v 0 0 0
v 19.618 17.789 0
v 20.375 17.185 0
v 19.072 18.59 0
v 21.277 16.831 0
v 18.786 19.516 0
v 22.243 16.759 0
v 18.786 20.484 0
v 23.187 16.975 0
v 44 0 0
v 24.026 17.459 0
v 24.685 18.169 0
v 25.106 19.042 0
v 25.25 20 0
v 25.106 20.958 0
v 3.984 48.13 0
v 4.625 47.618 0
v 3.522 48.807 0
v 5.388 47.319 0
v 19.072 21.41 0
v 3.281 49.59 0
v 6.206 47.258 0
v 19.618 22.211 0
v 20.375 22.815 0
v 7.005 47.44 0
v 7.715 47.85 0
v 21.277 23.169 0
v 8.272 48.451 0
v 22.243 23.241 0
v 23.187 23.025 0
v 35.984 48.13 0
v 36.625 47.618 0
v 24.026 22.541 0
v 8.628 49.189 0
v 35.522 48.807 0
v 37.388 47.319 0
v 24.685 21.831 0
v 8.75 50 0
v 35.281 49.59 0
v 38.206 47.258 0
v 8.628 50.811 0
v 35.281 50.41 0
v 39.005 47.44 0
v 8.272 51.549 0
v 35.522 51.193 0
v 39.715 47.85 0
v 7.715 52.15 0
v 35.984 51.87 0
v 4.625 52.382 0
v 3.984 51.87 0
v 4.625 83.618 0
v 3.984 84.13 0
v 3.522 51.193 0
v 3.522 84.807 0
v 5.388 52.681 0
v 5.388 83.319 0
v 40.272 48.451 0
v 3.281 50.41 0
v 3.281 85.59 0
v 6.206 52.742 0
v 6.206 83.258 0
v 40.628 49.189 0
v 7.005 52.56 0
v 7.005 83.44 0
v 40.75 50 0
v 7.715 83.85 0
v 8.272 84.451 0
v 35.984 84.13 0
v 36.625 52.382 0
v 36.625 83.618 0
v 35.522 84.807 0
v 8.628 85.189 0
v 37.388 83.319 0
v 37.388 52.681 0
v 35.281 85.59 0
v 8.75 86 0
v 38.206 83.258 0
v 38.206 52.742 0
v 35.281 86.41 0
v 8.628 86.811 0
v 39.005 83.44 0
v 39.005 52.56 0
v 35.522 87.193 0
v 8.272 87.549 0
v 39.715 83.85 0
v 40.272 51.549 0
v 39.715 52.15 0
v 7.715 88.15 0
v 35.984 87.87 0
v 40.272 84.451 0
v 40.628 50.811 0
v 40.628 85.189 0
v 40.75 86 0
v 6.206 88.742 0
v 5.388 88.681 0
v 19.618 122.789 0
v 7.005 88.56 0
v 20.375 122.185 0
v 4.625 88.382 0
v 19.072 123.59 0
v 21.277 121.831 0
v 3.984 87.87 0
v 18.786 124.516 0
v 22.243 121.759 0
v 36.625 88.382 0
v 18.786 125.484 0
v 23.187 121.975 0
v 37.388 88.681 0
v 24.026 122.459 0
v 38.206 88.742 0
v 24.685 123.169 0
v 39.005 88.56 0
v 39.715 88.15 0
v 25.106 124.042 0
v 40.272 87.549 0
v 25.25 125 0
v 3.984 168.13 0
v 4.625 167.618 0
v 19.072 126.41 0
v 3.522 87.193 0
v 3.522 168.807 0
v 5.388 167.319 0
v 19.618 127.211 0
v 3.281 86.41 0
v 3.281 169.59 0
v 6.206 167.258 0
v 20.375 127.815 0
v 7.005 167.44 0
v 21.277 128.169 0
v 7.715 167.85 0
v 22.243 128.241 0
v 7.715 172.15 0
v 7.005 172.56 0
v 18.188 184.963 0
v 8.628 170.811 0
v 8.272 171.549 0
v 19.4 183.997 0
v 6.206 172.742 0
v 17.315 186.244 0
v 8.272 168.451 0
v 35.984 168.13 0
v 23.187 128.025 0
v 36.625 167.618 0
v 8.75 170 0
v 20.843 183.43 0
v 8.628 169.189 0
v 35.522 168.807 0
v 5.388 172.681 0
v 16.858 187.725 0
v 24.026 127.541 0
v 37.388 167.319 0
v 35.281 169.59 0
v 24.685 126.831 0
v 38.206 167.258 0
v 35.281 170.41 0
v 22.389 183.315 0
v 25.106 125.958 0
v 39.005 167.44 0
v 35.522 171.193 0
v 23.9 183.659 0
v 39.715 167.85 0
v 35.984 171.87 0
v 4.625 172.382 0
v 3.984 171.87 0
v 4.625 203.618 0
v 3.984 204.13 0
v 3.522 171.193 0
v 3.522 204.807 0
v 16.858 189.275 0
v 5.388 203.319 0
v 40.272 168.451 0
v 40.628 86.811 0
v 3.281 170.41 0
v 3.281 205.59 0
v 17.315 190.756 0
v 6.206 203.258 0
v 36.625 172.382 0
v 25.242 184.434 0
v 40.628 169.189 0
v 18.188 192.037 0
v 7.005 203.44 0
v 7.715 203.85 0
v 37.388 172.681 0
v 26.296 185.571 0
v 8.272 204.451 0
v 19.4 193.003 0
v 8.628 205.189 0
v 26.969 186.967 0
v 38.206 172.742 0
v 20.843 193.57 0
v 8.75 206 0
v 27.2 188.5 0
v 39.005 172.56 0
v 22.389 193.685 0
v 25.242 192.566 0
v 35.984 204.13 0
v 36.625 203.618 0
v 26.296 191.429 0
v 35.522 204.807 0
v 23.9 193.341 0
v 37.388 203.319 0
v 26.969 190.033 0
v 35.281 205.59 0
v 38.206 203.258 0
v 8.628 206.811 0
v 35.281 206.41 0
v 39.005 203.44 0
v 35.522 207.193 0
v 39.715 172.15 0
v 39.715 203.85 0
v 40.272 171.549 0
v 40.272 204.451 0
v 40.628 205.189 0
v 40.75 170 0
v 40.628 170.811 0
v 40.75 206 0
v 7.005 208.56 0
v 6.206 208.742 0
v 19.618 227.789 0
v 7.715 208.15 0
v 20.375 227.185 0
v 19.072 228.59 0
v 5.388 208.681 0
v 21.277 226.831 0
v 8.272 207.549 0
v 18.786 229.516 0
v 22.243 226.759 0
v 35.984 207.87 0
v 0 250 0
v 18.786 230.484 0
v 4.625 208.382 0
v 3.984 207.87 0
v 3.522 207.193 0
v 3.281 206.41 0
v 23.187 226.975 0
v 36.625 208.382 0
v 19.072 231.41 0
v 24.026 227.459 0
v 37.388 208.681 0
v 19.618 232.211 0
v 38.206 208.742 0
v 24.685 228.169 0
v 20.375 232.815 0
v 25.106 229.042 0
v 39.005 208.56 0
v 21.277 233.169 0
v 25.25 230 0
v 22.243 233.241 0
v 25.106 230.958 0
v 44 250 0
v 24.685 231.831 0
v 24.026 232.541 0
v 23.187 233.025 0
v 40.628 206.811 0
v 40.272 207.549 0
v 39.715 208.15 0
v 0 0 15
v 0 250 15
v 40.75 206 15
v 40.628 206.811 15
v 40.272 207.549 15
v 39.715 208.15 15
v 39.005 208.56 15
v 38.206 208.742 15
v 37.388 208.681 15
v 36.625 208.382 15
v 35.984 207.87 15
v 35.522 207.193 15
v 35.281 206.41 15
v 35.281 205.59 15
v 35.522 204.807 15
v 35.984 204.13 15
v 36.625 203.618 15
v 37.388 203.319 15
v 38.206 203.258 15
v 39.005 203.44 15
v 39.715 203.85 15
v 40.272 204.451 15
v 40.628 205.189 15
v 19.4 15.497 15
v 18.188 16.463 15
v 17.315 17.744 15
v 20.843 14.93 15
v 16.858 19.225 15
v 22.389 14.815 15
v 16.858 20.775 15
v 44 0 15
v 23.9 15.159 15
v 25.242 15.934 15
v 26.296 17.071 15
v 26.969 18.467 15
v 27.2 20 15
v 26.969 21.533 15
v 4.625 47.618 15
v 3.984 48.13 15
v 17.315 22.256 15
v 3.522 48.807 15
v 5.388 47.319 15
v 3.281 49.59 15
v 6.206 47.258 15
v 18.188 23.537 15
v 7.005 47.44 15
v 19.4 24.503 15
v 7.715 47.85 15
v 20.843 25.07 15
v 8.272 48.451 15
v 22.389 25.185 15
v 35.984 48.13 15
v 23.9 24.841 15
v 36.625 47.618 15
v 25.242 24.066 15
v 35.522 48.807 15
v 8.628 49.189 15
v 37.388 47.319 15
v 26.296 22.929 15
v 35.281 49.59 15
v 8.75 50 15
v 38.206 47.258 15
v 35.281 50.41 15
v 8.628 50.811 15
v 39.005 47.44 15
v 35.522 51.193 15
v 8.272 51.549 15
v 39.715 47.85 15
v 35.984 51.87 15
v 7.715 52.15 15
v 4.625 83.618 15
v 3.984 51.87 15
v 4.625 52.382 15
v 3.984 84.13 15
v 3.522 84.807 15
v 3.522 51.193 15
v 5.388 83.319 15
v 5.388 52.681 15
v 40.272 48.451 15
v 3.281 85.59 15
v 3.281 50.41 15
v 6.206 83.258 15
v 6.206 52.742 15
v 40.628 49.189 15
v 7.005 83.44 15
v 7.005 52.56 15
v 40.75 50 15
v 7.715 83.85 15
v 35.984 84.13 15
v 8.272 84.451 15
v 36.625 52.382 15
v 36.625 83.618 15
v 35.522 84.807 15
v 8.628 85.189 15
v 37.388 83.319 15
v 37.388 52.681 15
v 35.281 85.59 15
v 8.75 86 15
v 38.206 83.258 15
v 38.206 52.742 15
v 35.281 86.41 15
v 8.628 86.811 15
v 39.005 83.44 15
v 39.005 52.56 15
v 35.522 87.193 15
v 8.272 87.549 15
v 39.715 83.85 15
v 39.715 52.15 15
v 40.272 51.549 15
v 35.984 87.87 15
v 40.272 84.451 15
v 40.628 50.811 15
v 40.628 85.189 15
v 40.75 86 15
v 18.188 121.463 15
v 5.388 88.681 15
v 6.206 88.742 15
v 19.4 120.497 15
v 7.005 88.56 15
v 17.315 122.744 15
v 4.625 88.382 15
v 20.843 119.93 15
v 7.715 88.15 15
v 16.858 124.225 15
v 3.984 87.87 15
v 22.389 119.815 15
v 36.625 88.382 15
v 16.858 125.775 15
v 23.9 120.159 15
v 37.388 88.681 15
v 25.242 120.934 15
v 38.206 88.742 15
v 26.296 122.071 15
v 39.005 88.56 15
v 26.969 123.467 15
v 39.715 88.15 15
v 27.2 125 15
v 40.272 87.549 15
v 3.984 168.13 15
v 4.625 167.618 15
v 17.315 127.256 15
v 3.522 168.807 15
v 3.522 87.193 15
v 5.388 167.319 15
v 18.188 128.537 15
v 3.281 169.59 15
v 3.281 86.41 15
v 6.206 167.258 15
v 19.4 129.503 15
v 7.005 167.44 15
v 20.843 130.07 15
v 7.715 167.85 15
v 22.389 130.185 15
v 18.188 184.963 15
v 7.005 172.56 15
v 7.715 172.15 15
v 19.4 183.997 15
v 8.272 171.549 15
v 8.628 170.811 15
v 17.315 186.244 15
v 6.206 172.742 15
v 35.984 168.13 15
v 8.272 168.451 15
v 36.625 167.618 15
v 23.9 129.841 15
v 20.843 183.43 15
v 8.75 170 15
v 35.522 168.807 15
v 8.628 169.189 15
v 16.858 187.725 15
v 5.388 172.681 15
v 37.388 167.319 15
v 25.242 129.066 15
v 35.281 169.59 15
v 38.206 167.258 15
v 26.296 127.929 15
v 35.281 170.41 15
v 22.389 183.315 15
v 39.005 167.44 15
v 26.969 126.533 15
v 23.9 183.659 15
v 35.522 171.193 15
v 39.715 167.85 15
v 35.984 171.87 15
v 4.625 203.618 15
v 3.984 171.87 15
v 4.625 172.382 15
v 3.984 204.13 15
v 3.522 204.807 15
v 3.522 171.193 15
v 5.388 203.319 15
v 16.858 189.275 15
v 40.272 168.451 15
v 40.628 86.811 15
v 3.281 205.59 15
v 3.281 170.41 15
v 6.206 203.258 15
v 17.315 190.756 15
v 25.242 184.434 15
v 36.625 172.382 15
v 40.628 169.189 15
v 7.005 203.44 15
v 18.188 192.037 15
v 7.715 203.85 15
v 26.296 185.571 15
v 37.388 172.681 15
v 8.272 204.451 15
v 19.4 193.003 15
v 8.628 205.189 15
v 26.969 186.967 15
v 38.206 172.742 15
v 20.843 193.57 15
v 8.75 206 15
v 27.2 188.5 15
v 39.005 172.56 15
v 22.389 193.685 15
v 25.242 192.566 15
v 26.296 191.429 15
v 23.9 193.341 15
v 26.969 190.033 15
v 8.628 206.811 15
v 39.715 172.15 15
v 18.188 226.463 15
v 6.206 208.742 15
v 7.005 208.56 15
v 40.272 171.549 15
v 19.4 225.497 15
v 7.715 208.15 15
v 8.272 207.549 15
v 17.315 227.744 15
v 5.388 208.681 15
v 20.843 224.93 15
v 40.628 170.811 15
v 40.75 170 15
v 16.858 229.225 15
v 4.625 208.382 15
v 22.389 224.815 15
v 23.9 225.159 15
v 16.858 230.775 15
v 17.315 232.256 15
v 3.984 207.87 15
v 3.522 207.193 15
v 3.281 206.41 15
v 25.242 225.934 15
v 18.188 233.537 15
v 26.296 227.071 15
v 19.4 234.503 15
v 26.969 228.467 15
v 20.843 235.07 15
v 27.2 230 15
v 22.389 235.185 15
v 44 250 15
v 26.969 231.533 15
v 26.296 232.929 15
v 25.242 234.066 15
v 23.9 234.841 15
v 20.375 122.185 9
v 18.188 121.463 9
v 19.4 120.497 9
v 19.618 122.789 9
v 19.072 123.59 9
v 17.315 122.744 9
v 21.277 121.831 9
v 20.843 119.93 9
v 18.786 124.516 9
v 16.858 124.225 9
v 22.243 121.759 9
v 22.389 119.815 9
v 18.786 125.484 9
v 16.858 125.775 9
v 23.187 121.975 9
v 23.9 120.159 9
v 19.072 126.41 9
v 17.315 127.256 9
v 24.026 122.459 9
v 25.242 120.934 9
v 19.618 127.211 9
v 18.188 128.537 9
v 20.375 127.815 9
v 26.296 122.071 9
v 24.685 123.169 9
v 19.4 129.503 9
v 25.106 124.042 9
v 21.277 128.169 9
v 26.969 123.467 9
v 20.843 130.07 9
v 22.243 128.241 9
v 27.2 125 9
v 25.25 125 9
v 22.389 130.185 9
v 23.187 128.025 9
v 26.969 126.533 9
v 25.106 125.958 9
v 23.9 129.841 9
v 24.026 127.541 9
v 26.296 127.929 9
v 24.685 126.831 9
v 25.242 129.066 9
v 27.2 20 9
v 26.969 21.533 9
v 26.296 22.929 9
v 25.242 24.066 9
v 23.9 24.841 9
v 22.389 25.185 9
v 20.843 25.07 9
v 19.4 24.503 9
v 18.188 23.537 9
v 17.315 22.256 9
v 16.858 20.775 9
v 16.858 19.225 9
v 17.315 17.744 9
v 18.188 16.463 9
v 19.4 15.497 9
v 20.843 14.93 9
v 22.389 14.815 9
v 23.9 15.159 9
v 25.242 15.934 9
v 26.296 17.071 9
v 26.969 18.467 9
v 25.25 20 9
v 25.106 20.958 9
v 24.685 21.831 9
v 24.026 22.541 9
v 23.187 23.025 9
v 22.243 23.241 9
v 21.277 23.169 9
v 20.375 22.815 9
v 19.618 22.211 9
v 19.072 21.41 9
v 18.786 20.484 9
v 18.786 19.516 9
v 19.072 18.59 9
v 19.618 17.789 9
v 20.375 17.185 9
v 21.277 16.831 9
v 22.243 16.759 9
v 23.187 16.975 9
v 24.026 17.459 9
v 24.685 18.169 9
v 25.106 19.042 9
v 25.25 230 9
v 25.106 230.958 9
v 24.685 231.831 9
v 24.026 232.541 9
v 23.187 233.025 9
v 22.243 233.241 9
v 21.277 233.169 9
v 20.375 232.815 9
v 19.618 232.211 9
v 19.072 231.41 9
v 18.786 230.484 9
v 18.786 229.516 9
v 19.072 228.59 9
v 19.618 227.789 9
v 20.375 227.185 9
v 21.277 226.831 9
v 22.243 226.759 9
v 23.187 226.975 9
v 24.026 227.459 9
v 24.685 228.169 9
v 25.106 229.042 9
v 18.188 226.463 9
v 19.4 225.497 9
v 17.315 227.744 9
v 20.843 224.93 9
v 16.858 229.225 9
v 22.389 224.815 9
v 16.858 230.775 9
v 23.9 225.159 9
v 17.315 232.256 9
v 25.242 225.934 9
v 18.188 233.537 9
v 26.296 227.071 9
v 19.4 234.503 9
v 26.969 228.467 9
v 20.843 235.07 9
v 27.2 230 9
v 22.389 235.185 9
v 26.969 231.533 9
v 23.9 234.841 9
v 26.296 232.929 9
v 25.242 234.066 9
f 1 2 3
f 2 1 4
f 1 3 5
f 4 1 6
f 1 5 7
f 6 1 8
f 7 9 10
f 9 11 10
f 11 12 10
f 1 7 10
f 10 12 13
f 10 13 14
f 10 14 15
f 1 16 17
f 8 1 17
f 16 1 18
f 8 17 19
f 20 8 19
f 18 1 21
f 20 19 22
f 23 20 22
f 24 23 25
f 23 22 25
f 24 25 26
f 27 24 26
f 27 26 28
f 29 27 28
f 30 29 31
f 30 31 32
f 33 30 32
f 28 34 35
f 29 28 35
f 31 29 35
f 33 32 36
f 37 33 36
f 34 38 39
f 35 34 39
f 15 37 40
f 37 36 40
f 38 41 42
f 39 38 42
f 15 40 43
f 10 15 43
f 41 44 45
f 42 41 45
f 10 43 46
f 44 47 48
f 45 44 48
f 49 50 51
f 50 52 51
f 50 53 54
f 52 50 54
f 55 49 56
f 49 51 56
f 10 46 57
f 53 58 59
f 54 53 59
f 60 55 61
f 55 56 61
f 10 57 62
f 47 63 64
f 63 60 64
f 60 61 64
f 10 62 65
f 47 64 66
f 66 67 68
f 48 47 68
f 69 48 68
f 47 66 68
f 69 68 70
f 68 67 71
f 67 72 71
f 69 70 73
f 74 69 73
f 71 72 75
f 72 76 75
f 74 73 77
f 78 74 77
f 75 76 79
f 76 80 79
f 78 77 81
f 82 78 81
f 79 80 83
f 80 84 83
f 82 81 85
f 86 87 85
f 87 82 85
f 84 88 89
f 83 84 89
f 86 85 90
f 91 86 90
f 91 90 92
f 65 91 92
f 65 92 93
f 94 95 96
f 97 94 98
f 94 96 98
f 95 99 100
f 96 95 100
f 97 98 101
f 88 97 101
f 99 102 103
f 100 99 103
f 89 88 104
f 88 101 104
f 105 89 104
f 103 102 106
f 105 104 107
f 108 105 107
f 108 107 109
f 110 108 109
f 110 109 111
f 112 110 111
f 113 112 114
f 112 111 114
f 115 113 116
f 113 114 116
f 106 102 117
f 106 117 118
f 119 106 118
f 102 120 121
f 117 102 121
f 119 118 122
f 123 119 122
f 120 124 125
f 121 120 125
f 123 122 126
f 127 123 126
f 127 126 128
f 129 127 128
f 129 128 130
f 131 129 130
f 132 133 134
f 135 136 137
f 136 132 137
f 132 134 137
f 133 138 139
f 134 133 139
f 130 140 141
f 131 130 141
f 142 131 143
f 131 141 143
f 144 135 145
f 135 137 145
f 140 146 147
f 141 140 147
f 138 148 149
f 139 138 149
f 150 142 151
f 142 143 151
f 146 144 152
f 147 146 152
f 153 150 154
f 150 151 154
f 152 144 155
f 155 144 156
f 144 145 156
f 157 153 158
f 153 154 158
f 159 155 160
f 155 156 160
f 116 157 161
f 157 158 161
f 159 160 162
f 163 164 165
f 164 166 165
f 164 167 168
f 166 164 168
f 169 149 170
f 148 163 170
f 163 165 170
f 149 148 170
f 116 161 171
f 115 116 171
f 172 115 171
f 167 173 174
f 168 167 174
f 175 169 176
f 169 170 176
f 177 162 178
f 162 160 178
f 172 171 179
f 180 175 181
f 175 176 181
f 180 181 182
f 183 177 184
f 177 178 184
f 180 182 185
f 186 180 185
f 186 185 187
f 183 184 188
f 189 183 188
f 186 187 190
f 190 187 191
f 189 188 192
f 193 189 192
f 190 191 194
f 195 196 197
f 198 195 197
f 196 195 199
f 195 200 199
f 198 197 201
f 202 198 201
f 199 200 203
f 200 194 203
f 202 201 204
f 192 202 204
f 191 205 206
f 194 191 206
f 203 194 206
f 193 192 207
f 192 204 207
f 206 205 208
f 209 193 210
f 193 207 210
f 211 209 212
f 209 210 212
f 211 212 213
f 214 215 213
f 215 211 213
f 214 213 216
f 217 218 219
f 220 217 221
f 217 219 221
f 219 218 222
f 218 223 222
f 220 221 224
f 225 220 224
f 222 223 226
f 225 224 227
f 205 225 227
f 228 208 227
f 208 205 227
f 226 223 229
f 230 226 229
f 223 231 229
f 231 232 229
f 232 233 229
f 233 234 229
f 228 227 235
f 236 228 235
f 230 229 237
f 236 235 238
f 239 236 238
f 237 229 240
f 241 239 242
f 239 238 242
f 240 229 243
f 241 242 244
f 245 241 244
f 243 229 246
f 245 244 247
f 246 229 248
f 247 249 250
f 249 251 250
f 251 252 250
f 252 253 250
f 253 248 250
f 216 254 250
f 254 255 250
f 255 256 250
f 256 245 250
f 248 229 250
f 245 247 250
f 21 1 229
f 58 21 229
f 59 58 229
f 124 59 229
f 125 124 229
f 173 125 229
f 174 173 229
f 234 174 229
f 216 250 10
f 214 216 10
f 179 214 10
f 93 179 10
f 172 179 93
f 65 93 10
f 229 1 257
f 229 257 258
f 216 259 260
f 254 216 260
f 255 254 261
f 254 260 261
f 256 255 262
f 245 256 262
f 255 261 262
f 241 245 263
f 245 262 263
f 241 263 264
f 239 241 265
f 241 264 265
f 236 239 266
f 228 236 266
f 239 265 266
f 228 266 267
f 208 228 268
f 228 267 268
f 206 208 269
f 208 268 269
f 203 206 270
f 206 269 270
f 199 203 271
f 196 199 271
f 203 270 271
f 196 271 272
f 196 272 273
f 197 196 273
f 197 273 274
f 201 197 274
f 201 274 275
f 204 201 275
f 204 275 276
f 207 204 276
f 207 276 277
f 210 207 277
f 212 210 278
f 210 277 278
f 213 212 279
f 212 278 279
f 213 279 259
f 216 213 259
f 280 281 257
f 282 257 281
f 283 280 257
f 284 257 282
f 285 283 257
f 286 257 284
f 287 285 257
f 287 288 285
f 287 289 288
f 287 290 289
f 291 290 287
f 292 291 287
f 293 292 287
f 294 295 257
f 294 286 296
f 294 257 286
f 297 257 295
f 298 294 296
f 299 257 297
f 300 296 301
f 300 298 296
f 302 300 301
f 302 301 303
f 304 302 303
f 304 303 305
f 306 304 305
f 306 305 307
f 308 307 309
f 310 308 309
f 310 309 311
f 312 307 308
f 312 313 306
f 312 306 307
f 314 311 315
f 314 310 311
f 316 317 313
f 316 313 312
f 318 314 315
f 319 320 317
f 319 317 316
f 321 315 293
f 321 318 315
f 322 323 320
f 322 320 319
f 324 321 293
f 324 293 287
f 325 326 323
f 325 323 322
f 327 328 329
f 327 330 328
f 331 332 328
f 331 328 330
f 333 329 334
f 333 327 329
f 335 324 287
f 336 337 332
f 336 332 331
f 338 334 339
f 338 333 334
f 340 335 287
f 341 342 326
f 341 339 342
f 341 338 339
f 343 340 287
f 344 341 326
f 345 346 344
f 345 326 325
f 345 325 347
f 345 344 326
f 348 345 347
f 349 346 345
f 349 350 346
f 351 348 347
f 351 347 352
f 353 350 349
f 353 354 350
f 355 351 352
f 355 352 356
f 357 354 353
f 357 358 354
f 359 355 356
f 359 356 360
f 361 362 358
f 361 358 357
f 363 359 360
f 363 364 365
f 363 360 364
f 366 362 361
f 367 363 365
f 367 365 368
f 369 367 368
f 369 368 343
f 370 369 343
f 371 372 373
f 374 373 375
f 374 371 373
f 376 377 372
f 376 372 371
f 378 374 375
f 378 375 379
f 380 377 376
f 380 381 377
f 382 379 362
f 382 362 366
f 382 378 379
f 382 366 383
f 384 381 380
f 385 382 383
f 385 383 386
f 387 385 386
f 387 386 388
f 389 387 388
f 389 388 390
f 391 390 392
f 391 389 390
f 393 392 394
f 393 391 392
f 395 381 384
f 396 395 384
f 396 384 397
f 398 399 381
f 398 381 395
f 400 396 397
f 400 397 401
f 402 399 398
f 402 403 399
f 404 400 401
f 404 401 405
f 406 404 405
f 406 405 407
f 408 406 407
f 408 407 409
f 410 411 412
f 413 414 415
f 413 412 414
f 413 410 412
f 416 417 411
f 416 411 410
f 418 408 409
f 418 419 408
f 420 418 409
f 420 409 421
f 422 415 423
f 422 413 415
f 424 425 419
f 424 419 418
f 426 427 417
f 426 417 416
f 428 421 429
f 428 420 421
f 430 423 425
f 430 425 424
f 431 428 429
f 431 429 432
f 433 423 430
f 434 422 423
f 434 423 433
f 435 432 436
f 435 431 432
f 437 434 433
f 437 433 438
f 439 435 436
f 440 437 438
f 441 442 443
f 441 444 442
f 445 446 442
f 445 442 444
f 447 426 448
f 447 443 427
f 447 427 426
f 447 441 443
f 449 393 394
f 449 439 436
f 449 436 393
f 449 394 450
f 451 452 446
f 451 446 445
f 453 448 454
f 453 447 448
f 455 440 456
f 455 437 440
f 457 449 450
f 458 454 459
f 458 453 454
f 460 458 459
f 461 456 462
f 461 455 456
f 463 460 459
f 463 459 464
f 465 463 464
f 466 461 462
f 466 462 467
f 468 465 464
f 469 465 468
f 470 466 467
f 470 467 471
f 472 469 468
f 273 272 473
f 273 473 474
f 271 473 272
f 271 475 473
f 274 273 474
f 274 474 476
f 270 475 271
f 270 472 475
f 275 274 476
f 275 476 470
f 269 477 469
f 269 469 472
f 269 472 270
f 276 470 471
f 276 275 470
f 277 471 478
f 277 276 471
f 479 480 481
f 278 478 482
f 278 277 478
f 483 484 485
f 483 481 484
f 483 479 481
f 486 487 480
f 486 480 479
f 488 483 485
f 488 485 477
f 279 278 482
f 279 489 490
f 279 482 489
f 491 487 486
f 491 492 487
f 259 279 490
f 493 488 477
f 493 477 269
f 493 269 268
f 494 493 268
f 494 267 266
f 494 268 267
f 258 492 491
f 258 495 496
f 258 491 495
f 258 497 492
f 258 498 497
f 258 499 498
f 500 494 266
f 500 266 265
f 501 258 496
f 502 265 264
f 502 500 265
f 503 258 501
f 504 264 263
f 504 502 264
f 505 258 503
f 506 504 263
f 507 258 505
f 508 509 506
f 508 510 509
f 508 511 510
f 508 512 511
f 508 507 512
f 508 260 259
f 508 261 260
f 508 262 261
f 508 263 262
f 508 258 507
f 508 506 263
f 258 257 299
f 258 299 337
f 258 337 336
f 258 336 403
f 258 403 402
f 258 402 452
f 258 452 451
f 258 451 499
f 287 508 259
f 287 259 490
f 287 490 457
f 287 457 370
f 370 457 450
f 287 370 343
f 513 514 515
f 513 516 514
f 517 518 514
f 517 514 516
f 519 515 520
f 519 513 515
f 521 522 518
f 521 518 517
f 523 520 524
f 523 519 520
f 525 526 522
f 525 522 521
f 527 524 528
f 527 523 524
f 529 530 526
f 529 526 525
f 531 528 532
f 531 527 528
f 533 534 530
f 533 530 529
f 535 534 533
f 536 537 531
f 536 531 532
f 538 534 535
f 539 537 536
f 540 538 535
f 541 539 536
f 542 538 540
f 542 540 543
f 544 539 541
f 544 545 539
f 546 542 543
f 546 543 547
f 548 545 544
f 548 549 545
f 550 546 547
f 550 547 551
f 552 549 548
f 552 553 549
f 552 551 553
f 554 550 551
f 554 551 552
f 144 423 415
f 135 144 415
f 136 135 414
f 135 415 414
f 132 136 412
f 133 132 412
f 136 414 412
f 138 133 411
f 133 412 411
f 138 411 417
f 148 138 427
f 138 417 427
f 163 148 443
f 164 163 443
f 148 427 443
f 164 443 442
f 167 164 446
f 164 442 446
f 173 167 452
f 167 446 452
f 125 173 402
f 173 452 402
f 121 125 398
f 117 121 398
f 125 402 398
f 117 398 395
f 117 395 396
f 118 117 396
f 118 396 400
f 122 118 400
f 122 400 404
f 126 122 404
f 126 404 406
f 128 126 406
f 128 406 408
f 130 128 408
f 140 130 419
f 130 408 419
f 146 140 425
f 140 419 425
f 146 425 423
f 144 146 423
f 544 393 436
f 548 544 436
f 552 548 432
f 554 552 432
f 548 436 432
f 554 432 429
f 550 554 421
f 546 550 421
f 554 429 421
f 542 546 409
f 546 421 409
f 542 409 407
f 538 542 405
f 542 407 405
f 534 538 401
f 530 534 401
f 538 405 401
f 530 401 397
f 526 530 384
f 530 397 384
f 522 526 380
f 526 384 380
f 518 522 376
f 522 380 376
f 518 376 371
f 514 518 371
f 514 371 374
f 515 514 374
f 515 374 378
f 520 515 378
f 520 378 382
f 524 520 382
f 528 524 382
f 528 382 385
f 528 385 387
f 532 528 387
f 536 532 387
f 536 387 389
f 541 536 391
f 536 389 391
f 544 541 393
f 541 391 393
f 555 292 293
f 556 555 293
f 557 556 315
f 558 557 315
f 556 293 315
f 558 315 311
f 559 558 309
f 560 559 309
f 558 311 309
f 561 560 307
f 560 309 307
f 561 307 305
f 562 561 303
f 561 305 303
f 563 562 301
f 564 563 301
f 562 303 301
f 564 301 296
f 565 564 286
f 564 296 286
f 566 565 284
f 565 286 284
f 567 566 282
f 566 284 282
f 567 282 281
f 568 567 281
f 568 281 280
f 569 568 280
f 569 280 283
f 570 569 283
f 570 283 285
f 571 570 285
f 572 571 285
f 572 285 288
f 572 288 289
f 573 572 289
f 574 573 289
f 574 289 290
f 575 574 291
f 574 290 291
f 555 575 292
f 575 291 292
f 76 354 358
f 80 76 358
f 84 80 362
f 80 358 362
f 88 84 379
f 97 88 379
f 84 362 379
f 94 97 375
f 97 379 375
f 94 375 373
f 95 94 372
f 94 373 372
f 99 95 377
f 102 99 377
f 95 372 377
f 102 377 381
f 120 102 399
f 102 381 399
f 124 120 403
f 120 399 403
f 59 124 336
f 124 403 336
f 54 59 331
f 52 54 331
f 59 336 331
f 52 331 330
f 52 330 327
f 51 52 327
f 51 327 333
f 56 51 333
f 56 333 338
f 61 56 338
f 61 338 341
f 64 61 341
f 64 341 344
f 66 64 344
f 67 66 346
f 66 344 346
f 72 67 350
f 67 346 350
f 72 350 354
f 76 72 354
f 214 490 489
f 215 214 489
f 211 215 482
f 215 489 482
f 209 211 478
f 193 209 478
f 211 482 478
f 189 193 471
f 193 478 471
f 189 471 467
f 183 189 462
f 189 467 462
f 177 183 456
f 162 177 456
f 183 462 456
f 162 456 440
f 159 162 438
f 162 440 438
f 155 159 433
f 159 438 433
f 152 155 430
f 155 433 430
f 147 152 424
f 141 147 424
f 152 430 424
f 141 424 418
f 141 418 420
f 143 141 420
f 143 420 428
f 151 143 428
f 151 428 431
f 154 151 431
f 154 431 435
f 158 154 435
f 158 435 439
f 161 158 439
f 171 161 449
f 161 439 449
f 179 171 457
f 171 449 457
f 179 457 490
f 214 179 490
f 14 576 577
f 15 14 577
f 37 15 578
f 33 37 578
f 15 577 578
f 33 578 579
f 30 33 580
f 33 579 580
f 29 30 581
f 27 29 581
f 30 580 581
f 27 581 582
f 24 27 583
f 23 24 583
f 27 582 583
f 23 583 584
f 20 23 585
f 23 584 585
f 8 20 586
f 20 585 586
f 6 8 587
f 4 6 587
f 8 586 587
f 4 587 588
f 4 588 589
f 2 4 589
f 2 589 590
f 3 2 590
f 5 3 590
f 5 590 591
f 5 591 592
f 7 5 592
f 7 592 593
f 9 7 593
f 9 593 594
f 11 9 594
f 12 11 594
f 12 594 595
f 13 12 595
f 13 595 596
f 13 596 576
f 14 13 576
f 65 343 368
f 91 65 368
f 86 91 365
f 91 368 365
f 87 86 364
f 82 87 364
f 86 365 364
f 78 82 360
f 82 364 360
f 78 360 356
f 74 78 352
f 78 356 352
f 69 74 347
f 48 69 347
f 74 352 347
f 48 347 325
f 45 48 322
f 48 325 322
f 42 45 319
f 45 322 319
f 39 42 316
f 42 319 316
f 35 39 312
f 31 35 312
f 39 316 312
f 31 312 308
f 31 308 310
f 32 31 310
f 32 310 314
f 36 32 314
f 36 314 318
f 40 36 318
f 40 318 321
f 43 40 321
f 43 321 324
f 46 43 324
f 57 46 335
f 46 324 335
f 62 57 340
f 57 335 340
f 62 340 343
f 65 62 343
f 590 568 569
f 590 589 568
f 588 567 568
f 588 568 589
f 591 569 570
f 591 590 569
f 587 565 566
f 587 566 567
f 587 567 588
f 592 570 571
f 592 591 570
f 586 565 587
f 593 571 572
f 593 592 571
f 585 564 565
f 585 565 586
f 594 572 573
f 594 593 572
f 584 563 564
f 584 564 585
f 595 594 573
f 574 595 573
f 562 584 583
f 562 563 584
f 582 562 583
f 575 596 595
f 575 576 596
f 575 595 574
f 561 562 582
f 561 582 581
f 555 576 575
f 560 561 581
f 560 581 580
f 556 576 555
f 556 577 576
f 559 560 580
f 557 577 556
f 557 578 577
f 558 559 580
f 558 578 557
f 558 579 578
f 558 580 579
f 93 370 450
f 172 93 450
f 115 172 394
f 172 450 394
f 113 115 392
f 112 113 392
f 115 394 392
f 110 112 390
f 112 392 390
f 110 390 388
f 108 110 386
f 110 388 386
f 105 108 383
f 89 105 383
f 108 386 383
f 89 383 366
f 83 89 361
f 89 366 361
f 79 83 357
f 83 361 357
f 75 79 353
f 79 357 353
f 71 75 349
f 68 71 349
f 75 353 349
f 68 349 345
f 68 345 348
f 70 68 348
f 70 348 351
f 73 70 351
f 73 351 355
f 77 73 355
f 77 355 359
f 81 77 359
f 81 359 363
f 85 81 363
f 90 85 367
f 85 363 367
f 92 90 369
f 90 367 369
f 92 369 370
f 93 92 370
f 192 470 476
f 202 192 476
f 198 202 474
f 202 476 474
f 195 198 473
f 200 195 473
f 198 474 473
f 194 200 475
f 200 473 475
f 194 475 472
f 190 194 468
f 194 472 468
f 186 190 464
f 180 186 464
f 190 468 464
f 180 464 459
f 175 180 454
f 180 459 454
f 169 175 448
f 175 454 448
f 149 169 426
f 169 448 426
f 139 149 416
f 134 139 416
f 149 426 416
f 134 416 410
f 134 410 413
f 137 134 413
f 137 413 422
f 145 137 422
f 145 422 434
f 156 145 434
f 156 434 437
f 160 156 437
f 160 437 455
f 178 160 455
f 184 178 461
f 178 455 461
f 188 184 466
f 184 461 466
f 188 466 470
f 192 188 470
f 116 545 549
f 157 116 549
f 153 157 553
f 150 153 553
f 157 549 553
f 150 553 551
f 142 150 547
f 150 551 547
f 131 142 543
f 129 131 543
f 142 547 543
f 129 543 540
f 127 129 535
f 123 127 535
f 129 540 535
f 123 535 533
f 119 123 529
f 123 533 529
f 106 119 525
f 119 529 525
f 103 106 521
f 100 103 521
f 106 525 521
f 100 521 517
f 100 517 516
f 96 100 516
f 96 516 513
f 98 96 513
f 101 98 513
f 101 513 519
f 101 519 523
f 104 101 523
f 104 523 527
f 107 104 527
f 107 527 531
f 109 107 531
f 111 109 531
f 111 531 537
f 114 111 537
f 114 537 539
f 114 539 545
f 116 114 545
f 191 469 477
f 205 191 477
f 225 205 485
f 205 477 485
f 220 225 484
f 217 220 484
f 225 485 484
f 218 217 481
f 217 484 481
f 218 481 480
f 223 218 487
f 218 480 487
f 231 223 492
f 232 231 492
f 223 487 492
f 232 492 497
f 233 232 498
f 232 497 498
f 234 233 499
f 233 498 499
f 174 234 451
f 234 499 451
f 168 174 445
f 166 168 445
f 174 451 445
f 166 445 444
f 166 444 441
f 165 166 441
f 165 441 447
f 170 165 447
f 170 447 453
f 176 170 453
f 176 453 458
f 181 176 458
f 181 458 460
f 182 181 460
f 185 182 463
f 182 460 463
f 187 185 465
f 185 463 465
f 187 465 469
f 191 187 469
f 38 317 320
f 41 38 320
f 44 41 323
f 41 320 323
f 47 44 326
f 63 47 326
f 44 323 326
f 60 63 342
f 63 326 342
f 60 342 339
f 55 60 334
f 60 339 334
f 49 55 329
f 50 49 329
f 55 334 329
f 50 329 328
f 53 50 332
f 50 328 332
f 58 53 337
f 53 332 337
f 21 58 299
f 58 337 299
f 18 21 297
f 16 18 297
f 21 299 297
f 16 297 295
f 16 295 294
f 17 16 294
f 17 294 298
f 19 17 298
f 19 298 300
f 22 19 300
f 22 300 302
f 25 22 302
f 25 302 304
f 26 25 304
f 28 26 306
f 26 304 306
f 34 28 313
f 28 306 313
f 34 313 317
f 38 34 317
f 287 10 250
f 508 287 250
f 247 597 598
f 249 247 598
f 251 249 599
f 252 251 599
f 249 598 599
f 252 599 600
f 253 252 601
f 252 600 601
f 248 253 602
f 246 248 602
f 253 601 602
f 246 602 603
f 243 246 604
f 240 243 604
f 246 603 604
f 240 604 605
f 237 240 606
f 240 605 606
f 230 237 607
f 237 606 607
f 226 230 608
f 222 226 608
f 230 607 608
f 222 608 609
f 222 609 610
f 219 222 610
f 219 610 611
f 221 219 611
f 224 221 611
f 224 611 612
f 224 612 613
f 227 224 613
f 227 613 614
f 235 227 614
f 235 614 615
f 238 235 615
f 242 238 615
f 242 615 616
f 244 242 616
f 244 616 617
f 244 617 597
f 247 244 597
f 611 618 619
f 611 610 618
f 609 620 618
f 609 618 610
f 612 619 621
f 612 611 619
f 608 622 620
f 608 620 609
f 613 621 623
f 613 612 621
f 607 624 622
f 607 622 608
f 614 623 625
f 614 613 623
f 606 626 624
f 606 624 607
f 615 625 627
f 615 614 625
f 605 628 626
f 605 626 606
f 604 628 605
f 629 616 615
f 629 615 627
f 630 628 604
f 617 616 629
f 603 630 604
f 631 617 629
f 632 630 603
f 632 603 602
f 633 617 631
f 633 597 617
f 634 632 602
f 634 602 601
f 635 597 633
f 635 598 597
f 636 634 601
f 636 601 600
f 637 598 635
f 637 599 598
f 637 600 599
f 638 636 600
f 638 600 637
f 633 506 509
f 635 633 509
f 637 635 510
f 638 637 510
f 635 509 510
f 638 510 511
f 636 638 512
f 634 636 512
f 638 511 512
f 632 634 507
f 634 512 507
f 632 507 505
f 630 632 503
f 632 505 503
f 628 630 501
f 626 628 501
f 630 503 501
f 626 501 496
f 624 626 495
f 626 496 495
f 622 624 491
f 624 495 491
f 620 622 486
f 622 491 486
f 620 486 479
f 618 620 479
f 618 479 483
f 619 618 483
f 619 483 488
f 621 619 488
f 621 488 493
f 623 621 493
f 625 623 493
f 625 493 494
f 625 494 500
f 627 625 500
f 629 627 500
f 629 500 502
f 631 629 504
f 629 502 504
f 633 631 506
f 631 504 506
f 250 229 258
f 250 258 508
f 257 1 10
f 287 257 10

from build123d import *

# Parameters (mm, degrees)
SKETCH_W        = 44
SKETCH_H        = 250
PAD_DEPTH       = 15
SKETCH001_R     = 3.25
POCKET_DEPTH    = 15
SKETCH002_R     = 2.75
POCKET001_DEPTH = 15
SKETCH003_R     = 5.2
POCKET002_DEPTH = 6
SKETCH004_R     = 5.2
POCKET003_DEPTH = 15


with BuildPart() as part:
    # Sketch → Pad (new body)
    with BuildSketch(Plane.XY):
        with Locations((22, 125)):
            Rectangle(SKETCH_W, SKETCH_H)
    extrude(amount=PAD_DEPTH)

    # Sketch001 (on Face6 of Pad) → Pocket (cut)
    with BuildSketch(Plane.XY.offset(15)):
        with Locations((22, 230)):
            Circle(SKETCH001_R)
        with Locations((22, 125)):
            Circle(SKETCH001_R)
        with Locations((22, 20)):
            Circle(SKETCH001_R)
    extrude(amount=-POCKET_DEPTH, mode=Mode.SUBTRACT)

    # Sketch002 (on Face5 of Pocket) → Pocket001 (cut)
    with BuildSketch(Plane.XY.offset(15)):
        with Locations((6, 206)):
            Circle(SKETCH002_R)
        with Locations((38, 206)):
            Circle(SKETCH002_R)
        with Locations((6, 170)):
            Circle(SKETCH002_R)
        with Locations((38, 170)):
            Circle(SKETCH002_R)
        with Locations((6, 86)):
            Circle(SKETCH002_R)
        with Locations((38, 86)):
            Circle(SKETCH002_R)
        with Locations((6, 50)):
            Circle(SKETCH002_R)
        with Locations((38, 50)):
            Circle(SKETCH002_R)
    extrude(amount=-POCKET001_DEPTH, mode=Mode.SUBTRACT)

    # Sketch003 (on Face5 of Pocket001) → Pocket002 (cut)
    with BuildSketch(Plane.XY.offset(15)):
        with Locations((22, 20)):
            Circle(SKETCH003_R)
        with Locations((22, 125)):
            Circle(SKETCH003_R)
        with Locations((22, 230)):
            Circle(SKETCH003_R)
    extrude(amount=-POCKET002_DEPTH, mode=Mode.SUBTRACT)

    # Sketch004 (on Face5 of Pocket002) → Pocket003 (cut)
    with BuildSketch(Plane.XY.offset(15)):
        with Locations((22, 188.5)):
            Circle(SKETCH004_R)
    extrude(amount=-POCKET003_DEPTH, mode=Mode.SUBTRACT)


solid = part.part
